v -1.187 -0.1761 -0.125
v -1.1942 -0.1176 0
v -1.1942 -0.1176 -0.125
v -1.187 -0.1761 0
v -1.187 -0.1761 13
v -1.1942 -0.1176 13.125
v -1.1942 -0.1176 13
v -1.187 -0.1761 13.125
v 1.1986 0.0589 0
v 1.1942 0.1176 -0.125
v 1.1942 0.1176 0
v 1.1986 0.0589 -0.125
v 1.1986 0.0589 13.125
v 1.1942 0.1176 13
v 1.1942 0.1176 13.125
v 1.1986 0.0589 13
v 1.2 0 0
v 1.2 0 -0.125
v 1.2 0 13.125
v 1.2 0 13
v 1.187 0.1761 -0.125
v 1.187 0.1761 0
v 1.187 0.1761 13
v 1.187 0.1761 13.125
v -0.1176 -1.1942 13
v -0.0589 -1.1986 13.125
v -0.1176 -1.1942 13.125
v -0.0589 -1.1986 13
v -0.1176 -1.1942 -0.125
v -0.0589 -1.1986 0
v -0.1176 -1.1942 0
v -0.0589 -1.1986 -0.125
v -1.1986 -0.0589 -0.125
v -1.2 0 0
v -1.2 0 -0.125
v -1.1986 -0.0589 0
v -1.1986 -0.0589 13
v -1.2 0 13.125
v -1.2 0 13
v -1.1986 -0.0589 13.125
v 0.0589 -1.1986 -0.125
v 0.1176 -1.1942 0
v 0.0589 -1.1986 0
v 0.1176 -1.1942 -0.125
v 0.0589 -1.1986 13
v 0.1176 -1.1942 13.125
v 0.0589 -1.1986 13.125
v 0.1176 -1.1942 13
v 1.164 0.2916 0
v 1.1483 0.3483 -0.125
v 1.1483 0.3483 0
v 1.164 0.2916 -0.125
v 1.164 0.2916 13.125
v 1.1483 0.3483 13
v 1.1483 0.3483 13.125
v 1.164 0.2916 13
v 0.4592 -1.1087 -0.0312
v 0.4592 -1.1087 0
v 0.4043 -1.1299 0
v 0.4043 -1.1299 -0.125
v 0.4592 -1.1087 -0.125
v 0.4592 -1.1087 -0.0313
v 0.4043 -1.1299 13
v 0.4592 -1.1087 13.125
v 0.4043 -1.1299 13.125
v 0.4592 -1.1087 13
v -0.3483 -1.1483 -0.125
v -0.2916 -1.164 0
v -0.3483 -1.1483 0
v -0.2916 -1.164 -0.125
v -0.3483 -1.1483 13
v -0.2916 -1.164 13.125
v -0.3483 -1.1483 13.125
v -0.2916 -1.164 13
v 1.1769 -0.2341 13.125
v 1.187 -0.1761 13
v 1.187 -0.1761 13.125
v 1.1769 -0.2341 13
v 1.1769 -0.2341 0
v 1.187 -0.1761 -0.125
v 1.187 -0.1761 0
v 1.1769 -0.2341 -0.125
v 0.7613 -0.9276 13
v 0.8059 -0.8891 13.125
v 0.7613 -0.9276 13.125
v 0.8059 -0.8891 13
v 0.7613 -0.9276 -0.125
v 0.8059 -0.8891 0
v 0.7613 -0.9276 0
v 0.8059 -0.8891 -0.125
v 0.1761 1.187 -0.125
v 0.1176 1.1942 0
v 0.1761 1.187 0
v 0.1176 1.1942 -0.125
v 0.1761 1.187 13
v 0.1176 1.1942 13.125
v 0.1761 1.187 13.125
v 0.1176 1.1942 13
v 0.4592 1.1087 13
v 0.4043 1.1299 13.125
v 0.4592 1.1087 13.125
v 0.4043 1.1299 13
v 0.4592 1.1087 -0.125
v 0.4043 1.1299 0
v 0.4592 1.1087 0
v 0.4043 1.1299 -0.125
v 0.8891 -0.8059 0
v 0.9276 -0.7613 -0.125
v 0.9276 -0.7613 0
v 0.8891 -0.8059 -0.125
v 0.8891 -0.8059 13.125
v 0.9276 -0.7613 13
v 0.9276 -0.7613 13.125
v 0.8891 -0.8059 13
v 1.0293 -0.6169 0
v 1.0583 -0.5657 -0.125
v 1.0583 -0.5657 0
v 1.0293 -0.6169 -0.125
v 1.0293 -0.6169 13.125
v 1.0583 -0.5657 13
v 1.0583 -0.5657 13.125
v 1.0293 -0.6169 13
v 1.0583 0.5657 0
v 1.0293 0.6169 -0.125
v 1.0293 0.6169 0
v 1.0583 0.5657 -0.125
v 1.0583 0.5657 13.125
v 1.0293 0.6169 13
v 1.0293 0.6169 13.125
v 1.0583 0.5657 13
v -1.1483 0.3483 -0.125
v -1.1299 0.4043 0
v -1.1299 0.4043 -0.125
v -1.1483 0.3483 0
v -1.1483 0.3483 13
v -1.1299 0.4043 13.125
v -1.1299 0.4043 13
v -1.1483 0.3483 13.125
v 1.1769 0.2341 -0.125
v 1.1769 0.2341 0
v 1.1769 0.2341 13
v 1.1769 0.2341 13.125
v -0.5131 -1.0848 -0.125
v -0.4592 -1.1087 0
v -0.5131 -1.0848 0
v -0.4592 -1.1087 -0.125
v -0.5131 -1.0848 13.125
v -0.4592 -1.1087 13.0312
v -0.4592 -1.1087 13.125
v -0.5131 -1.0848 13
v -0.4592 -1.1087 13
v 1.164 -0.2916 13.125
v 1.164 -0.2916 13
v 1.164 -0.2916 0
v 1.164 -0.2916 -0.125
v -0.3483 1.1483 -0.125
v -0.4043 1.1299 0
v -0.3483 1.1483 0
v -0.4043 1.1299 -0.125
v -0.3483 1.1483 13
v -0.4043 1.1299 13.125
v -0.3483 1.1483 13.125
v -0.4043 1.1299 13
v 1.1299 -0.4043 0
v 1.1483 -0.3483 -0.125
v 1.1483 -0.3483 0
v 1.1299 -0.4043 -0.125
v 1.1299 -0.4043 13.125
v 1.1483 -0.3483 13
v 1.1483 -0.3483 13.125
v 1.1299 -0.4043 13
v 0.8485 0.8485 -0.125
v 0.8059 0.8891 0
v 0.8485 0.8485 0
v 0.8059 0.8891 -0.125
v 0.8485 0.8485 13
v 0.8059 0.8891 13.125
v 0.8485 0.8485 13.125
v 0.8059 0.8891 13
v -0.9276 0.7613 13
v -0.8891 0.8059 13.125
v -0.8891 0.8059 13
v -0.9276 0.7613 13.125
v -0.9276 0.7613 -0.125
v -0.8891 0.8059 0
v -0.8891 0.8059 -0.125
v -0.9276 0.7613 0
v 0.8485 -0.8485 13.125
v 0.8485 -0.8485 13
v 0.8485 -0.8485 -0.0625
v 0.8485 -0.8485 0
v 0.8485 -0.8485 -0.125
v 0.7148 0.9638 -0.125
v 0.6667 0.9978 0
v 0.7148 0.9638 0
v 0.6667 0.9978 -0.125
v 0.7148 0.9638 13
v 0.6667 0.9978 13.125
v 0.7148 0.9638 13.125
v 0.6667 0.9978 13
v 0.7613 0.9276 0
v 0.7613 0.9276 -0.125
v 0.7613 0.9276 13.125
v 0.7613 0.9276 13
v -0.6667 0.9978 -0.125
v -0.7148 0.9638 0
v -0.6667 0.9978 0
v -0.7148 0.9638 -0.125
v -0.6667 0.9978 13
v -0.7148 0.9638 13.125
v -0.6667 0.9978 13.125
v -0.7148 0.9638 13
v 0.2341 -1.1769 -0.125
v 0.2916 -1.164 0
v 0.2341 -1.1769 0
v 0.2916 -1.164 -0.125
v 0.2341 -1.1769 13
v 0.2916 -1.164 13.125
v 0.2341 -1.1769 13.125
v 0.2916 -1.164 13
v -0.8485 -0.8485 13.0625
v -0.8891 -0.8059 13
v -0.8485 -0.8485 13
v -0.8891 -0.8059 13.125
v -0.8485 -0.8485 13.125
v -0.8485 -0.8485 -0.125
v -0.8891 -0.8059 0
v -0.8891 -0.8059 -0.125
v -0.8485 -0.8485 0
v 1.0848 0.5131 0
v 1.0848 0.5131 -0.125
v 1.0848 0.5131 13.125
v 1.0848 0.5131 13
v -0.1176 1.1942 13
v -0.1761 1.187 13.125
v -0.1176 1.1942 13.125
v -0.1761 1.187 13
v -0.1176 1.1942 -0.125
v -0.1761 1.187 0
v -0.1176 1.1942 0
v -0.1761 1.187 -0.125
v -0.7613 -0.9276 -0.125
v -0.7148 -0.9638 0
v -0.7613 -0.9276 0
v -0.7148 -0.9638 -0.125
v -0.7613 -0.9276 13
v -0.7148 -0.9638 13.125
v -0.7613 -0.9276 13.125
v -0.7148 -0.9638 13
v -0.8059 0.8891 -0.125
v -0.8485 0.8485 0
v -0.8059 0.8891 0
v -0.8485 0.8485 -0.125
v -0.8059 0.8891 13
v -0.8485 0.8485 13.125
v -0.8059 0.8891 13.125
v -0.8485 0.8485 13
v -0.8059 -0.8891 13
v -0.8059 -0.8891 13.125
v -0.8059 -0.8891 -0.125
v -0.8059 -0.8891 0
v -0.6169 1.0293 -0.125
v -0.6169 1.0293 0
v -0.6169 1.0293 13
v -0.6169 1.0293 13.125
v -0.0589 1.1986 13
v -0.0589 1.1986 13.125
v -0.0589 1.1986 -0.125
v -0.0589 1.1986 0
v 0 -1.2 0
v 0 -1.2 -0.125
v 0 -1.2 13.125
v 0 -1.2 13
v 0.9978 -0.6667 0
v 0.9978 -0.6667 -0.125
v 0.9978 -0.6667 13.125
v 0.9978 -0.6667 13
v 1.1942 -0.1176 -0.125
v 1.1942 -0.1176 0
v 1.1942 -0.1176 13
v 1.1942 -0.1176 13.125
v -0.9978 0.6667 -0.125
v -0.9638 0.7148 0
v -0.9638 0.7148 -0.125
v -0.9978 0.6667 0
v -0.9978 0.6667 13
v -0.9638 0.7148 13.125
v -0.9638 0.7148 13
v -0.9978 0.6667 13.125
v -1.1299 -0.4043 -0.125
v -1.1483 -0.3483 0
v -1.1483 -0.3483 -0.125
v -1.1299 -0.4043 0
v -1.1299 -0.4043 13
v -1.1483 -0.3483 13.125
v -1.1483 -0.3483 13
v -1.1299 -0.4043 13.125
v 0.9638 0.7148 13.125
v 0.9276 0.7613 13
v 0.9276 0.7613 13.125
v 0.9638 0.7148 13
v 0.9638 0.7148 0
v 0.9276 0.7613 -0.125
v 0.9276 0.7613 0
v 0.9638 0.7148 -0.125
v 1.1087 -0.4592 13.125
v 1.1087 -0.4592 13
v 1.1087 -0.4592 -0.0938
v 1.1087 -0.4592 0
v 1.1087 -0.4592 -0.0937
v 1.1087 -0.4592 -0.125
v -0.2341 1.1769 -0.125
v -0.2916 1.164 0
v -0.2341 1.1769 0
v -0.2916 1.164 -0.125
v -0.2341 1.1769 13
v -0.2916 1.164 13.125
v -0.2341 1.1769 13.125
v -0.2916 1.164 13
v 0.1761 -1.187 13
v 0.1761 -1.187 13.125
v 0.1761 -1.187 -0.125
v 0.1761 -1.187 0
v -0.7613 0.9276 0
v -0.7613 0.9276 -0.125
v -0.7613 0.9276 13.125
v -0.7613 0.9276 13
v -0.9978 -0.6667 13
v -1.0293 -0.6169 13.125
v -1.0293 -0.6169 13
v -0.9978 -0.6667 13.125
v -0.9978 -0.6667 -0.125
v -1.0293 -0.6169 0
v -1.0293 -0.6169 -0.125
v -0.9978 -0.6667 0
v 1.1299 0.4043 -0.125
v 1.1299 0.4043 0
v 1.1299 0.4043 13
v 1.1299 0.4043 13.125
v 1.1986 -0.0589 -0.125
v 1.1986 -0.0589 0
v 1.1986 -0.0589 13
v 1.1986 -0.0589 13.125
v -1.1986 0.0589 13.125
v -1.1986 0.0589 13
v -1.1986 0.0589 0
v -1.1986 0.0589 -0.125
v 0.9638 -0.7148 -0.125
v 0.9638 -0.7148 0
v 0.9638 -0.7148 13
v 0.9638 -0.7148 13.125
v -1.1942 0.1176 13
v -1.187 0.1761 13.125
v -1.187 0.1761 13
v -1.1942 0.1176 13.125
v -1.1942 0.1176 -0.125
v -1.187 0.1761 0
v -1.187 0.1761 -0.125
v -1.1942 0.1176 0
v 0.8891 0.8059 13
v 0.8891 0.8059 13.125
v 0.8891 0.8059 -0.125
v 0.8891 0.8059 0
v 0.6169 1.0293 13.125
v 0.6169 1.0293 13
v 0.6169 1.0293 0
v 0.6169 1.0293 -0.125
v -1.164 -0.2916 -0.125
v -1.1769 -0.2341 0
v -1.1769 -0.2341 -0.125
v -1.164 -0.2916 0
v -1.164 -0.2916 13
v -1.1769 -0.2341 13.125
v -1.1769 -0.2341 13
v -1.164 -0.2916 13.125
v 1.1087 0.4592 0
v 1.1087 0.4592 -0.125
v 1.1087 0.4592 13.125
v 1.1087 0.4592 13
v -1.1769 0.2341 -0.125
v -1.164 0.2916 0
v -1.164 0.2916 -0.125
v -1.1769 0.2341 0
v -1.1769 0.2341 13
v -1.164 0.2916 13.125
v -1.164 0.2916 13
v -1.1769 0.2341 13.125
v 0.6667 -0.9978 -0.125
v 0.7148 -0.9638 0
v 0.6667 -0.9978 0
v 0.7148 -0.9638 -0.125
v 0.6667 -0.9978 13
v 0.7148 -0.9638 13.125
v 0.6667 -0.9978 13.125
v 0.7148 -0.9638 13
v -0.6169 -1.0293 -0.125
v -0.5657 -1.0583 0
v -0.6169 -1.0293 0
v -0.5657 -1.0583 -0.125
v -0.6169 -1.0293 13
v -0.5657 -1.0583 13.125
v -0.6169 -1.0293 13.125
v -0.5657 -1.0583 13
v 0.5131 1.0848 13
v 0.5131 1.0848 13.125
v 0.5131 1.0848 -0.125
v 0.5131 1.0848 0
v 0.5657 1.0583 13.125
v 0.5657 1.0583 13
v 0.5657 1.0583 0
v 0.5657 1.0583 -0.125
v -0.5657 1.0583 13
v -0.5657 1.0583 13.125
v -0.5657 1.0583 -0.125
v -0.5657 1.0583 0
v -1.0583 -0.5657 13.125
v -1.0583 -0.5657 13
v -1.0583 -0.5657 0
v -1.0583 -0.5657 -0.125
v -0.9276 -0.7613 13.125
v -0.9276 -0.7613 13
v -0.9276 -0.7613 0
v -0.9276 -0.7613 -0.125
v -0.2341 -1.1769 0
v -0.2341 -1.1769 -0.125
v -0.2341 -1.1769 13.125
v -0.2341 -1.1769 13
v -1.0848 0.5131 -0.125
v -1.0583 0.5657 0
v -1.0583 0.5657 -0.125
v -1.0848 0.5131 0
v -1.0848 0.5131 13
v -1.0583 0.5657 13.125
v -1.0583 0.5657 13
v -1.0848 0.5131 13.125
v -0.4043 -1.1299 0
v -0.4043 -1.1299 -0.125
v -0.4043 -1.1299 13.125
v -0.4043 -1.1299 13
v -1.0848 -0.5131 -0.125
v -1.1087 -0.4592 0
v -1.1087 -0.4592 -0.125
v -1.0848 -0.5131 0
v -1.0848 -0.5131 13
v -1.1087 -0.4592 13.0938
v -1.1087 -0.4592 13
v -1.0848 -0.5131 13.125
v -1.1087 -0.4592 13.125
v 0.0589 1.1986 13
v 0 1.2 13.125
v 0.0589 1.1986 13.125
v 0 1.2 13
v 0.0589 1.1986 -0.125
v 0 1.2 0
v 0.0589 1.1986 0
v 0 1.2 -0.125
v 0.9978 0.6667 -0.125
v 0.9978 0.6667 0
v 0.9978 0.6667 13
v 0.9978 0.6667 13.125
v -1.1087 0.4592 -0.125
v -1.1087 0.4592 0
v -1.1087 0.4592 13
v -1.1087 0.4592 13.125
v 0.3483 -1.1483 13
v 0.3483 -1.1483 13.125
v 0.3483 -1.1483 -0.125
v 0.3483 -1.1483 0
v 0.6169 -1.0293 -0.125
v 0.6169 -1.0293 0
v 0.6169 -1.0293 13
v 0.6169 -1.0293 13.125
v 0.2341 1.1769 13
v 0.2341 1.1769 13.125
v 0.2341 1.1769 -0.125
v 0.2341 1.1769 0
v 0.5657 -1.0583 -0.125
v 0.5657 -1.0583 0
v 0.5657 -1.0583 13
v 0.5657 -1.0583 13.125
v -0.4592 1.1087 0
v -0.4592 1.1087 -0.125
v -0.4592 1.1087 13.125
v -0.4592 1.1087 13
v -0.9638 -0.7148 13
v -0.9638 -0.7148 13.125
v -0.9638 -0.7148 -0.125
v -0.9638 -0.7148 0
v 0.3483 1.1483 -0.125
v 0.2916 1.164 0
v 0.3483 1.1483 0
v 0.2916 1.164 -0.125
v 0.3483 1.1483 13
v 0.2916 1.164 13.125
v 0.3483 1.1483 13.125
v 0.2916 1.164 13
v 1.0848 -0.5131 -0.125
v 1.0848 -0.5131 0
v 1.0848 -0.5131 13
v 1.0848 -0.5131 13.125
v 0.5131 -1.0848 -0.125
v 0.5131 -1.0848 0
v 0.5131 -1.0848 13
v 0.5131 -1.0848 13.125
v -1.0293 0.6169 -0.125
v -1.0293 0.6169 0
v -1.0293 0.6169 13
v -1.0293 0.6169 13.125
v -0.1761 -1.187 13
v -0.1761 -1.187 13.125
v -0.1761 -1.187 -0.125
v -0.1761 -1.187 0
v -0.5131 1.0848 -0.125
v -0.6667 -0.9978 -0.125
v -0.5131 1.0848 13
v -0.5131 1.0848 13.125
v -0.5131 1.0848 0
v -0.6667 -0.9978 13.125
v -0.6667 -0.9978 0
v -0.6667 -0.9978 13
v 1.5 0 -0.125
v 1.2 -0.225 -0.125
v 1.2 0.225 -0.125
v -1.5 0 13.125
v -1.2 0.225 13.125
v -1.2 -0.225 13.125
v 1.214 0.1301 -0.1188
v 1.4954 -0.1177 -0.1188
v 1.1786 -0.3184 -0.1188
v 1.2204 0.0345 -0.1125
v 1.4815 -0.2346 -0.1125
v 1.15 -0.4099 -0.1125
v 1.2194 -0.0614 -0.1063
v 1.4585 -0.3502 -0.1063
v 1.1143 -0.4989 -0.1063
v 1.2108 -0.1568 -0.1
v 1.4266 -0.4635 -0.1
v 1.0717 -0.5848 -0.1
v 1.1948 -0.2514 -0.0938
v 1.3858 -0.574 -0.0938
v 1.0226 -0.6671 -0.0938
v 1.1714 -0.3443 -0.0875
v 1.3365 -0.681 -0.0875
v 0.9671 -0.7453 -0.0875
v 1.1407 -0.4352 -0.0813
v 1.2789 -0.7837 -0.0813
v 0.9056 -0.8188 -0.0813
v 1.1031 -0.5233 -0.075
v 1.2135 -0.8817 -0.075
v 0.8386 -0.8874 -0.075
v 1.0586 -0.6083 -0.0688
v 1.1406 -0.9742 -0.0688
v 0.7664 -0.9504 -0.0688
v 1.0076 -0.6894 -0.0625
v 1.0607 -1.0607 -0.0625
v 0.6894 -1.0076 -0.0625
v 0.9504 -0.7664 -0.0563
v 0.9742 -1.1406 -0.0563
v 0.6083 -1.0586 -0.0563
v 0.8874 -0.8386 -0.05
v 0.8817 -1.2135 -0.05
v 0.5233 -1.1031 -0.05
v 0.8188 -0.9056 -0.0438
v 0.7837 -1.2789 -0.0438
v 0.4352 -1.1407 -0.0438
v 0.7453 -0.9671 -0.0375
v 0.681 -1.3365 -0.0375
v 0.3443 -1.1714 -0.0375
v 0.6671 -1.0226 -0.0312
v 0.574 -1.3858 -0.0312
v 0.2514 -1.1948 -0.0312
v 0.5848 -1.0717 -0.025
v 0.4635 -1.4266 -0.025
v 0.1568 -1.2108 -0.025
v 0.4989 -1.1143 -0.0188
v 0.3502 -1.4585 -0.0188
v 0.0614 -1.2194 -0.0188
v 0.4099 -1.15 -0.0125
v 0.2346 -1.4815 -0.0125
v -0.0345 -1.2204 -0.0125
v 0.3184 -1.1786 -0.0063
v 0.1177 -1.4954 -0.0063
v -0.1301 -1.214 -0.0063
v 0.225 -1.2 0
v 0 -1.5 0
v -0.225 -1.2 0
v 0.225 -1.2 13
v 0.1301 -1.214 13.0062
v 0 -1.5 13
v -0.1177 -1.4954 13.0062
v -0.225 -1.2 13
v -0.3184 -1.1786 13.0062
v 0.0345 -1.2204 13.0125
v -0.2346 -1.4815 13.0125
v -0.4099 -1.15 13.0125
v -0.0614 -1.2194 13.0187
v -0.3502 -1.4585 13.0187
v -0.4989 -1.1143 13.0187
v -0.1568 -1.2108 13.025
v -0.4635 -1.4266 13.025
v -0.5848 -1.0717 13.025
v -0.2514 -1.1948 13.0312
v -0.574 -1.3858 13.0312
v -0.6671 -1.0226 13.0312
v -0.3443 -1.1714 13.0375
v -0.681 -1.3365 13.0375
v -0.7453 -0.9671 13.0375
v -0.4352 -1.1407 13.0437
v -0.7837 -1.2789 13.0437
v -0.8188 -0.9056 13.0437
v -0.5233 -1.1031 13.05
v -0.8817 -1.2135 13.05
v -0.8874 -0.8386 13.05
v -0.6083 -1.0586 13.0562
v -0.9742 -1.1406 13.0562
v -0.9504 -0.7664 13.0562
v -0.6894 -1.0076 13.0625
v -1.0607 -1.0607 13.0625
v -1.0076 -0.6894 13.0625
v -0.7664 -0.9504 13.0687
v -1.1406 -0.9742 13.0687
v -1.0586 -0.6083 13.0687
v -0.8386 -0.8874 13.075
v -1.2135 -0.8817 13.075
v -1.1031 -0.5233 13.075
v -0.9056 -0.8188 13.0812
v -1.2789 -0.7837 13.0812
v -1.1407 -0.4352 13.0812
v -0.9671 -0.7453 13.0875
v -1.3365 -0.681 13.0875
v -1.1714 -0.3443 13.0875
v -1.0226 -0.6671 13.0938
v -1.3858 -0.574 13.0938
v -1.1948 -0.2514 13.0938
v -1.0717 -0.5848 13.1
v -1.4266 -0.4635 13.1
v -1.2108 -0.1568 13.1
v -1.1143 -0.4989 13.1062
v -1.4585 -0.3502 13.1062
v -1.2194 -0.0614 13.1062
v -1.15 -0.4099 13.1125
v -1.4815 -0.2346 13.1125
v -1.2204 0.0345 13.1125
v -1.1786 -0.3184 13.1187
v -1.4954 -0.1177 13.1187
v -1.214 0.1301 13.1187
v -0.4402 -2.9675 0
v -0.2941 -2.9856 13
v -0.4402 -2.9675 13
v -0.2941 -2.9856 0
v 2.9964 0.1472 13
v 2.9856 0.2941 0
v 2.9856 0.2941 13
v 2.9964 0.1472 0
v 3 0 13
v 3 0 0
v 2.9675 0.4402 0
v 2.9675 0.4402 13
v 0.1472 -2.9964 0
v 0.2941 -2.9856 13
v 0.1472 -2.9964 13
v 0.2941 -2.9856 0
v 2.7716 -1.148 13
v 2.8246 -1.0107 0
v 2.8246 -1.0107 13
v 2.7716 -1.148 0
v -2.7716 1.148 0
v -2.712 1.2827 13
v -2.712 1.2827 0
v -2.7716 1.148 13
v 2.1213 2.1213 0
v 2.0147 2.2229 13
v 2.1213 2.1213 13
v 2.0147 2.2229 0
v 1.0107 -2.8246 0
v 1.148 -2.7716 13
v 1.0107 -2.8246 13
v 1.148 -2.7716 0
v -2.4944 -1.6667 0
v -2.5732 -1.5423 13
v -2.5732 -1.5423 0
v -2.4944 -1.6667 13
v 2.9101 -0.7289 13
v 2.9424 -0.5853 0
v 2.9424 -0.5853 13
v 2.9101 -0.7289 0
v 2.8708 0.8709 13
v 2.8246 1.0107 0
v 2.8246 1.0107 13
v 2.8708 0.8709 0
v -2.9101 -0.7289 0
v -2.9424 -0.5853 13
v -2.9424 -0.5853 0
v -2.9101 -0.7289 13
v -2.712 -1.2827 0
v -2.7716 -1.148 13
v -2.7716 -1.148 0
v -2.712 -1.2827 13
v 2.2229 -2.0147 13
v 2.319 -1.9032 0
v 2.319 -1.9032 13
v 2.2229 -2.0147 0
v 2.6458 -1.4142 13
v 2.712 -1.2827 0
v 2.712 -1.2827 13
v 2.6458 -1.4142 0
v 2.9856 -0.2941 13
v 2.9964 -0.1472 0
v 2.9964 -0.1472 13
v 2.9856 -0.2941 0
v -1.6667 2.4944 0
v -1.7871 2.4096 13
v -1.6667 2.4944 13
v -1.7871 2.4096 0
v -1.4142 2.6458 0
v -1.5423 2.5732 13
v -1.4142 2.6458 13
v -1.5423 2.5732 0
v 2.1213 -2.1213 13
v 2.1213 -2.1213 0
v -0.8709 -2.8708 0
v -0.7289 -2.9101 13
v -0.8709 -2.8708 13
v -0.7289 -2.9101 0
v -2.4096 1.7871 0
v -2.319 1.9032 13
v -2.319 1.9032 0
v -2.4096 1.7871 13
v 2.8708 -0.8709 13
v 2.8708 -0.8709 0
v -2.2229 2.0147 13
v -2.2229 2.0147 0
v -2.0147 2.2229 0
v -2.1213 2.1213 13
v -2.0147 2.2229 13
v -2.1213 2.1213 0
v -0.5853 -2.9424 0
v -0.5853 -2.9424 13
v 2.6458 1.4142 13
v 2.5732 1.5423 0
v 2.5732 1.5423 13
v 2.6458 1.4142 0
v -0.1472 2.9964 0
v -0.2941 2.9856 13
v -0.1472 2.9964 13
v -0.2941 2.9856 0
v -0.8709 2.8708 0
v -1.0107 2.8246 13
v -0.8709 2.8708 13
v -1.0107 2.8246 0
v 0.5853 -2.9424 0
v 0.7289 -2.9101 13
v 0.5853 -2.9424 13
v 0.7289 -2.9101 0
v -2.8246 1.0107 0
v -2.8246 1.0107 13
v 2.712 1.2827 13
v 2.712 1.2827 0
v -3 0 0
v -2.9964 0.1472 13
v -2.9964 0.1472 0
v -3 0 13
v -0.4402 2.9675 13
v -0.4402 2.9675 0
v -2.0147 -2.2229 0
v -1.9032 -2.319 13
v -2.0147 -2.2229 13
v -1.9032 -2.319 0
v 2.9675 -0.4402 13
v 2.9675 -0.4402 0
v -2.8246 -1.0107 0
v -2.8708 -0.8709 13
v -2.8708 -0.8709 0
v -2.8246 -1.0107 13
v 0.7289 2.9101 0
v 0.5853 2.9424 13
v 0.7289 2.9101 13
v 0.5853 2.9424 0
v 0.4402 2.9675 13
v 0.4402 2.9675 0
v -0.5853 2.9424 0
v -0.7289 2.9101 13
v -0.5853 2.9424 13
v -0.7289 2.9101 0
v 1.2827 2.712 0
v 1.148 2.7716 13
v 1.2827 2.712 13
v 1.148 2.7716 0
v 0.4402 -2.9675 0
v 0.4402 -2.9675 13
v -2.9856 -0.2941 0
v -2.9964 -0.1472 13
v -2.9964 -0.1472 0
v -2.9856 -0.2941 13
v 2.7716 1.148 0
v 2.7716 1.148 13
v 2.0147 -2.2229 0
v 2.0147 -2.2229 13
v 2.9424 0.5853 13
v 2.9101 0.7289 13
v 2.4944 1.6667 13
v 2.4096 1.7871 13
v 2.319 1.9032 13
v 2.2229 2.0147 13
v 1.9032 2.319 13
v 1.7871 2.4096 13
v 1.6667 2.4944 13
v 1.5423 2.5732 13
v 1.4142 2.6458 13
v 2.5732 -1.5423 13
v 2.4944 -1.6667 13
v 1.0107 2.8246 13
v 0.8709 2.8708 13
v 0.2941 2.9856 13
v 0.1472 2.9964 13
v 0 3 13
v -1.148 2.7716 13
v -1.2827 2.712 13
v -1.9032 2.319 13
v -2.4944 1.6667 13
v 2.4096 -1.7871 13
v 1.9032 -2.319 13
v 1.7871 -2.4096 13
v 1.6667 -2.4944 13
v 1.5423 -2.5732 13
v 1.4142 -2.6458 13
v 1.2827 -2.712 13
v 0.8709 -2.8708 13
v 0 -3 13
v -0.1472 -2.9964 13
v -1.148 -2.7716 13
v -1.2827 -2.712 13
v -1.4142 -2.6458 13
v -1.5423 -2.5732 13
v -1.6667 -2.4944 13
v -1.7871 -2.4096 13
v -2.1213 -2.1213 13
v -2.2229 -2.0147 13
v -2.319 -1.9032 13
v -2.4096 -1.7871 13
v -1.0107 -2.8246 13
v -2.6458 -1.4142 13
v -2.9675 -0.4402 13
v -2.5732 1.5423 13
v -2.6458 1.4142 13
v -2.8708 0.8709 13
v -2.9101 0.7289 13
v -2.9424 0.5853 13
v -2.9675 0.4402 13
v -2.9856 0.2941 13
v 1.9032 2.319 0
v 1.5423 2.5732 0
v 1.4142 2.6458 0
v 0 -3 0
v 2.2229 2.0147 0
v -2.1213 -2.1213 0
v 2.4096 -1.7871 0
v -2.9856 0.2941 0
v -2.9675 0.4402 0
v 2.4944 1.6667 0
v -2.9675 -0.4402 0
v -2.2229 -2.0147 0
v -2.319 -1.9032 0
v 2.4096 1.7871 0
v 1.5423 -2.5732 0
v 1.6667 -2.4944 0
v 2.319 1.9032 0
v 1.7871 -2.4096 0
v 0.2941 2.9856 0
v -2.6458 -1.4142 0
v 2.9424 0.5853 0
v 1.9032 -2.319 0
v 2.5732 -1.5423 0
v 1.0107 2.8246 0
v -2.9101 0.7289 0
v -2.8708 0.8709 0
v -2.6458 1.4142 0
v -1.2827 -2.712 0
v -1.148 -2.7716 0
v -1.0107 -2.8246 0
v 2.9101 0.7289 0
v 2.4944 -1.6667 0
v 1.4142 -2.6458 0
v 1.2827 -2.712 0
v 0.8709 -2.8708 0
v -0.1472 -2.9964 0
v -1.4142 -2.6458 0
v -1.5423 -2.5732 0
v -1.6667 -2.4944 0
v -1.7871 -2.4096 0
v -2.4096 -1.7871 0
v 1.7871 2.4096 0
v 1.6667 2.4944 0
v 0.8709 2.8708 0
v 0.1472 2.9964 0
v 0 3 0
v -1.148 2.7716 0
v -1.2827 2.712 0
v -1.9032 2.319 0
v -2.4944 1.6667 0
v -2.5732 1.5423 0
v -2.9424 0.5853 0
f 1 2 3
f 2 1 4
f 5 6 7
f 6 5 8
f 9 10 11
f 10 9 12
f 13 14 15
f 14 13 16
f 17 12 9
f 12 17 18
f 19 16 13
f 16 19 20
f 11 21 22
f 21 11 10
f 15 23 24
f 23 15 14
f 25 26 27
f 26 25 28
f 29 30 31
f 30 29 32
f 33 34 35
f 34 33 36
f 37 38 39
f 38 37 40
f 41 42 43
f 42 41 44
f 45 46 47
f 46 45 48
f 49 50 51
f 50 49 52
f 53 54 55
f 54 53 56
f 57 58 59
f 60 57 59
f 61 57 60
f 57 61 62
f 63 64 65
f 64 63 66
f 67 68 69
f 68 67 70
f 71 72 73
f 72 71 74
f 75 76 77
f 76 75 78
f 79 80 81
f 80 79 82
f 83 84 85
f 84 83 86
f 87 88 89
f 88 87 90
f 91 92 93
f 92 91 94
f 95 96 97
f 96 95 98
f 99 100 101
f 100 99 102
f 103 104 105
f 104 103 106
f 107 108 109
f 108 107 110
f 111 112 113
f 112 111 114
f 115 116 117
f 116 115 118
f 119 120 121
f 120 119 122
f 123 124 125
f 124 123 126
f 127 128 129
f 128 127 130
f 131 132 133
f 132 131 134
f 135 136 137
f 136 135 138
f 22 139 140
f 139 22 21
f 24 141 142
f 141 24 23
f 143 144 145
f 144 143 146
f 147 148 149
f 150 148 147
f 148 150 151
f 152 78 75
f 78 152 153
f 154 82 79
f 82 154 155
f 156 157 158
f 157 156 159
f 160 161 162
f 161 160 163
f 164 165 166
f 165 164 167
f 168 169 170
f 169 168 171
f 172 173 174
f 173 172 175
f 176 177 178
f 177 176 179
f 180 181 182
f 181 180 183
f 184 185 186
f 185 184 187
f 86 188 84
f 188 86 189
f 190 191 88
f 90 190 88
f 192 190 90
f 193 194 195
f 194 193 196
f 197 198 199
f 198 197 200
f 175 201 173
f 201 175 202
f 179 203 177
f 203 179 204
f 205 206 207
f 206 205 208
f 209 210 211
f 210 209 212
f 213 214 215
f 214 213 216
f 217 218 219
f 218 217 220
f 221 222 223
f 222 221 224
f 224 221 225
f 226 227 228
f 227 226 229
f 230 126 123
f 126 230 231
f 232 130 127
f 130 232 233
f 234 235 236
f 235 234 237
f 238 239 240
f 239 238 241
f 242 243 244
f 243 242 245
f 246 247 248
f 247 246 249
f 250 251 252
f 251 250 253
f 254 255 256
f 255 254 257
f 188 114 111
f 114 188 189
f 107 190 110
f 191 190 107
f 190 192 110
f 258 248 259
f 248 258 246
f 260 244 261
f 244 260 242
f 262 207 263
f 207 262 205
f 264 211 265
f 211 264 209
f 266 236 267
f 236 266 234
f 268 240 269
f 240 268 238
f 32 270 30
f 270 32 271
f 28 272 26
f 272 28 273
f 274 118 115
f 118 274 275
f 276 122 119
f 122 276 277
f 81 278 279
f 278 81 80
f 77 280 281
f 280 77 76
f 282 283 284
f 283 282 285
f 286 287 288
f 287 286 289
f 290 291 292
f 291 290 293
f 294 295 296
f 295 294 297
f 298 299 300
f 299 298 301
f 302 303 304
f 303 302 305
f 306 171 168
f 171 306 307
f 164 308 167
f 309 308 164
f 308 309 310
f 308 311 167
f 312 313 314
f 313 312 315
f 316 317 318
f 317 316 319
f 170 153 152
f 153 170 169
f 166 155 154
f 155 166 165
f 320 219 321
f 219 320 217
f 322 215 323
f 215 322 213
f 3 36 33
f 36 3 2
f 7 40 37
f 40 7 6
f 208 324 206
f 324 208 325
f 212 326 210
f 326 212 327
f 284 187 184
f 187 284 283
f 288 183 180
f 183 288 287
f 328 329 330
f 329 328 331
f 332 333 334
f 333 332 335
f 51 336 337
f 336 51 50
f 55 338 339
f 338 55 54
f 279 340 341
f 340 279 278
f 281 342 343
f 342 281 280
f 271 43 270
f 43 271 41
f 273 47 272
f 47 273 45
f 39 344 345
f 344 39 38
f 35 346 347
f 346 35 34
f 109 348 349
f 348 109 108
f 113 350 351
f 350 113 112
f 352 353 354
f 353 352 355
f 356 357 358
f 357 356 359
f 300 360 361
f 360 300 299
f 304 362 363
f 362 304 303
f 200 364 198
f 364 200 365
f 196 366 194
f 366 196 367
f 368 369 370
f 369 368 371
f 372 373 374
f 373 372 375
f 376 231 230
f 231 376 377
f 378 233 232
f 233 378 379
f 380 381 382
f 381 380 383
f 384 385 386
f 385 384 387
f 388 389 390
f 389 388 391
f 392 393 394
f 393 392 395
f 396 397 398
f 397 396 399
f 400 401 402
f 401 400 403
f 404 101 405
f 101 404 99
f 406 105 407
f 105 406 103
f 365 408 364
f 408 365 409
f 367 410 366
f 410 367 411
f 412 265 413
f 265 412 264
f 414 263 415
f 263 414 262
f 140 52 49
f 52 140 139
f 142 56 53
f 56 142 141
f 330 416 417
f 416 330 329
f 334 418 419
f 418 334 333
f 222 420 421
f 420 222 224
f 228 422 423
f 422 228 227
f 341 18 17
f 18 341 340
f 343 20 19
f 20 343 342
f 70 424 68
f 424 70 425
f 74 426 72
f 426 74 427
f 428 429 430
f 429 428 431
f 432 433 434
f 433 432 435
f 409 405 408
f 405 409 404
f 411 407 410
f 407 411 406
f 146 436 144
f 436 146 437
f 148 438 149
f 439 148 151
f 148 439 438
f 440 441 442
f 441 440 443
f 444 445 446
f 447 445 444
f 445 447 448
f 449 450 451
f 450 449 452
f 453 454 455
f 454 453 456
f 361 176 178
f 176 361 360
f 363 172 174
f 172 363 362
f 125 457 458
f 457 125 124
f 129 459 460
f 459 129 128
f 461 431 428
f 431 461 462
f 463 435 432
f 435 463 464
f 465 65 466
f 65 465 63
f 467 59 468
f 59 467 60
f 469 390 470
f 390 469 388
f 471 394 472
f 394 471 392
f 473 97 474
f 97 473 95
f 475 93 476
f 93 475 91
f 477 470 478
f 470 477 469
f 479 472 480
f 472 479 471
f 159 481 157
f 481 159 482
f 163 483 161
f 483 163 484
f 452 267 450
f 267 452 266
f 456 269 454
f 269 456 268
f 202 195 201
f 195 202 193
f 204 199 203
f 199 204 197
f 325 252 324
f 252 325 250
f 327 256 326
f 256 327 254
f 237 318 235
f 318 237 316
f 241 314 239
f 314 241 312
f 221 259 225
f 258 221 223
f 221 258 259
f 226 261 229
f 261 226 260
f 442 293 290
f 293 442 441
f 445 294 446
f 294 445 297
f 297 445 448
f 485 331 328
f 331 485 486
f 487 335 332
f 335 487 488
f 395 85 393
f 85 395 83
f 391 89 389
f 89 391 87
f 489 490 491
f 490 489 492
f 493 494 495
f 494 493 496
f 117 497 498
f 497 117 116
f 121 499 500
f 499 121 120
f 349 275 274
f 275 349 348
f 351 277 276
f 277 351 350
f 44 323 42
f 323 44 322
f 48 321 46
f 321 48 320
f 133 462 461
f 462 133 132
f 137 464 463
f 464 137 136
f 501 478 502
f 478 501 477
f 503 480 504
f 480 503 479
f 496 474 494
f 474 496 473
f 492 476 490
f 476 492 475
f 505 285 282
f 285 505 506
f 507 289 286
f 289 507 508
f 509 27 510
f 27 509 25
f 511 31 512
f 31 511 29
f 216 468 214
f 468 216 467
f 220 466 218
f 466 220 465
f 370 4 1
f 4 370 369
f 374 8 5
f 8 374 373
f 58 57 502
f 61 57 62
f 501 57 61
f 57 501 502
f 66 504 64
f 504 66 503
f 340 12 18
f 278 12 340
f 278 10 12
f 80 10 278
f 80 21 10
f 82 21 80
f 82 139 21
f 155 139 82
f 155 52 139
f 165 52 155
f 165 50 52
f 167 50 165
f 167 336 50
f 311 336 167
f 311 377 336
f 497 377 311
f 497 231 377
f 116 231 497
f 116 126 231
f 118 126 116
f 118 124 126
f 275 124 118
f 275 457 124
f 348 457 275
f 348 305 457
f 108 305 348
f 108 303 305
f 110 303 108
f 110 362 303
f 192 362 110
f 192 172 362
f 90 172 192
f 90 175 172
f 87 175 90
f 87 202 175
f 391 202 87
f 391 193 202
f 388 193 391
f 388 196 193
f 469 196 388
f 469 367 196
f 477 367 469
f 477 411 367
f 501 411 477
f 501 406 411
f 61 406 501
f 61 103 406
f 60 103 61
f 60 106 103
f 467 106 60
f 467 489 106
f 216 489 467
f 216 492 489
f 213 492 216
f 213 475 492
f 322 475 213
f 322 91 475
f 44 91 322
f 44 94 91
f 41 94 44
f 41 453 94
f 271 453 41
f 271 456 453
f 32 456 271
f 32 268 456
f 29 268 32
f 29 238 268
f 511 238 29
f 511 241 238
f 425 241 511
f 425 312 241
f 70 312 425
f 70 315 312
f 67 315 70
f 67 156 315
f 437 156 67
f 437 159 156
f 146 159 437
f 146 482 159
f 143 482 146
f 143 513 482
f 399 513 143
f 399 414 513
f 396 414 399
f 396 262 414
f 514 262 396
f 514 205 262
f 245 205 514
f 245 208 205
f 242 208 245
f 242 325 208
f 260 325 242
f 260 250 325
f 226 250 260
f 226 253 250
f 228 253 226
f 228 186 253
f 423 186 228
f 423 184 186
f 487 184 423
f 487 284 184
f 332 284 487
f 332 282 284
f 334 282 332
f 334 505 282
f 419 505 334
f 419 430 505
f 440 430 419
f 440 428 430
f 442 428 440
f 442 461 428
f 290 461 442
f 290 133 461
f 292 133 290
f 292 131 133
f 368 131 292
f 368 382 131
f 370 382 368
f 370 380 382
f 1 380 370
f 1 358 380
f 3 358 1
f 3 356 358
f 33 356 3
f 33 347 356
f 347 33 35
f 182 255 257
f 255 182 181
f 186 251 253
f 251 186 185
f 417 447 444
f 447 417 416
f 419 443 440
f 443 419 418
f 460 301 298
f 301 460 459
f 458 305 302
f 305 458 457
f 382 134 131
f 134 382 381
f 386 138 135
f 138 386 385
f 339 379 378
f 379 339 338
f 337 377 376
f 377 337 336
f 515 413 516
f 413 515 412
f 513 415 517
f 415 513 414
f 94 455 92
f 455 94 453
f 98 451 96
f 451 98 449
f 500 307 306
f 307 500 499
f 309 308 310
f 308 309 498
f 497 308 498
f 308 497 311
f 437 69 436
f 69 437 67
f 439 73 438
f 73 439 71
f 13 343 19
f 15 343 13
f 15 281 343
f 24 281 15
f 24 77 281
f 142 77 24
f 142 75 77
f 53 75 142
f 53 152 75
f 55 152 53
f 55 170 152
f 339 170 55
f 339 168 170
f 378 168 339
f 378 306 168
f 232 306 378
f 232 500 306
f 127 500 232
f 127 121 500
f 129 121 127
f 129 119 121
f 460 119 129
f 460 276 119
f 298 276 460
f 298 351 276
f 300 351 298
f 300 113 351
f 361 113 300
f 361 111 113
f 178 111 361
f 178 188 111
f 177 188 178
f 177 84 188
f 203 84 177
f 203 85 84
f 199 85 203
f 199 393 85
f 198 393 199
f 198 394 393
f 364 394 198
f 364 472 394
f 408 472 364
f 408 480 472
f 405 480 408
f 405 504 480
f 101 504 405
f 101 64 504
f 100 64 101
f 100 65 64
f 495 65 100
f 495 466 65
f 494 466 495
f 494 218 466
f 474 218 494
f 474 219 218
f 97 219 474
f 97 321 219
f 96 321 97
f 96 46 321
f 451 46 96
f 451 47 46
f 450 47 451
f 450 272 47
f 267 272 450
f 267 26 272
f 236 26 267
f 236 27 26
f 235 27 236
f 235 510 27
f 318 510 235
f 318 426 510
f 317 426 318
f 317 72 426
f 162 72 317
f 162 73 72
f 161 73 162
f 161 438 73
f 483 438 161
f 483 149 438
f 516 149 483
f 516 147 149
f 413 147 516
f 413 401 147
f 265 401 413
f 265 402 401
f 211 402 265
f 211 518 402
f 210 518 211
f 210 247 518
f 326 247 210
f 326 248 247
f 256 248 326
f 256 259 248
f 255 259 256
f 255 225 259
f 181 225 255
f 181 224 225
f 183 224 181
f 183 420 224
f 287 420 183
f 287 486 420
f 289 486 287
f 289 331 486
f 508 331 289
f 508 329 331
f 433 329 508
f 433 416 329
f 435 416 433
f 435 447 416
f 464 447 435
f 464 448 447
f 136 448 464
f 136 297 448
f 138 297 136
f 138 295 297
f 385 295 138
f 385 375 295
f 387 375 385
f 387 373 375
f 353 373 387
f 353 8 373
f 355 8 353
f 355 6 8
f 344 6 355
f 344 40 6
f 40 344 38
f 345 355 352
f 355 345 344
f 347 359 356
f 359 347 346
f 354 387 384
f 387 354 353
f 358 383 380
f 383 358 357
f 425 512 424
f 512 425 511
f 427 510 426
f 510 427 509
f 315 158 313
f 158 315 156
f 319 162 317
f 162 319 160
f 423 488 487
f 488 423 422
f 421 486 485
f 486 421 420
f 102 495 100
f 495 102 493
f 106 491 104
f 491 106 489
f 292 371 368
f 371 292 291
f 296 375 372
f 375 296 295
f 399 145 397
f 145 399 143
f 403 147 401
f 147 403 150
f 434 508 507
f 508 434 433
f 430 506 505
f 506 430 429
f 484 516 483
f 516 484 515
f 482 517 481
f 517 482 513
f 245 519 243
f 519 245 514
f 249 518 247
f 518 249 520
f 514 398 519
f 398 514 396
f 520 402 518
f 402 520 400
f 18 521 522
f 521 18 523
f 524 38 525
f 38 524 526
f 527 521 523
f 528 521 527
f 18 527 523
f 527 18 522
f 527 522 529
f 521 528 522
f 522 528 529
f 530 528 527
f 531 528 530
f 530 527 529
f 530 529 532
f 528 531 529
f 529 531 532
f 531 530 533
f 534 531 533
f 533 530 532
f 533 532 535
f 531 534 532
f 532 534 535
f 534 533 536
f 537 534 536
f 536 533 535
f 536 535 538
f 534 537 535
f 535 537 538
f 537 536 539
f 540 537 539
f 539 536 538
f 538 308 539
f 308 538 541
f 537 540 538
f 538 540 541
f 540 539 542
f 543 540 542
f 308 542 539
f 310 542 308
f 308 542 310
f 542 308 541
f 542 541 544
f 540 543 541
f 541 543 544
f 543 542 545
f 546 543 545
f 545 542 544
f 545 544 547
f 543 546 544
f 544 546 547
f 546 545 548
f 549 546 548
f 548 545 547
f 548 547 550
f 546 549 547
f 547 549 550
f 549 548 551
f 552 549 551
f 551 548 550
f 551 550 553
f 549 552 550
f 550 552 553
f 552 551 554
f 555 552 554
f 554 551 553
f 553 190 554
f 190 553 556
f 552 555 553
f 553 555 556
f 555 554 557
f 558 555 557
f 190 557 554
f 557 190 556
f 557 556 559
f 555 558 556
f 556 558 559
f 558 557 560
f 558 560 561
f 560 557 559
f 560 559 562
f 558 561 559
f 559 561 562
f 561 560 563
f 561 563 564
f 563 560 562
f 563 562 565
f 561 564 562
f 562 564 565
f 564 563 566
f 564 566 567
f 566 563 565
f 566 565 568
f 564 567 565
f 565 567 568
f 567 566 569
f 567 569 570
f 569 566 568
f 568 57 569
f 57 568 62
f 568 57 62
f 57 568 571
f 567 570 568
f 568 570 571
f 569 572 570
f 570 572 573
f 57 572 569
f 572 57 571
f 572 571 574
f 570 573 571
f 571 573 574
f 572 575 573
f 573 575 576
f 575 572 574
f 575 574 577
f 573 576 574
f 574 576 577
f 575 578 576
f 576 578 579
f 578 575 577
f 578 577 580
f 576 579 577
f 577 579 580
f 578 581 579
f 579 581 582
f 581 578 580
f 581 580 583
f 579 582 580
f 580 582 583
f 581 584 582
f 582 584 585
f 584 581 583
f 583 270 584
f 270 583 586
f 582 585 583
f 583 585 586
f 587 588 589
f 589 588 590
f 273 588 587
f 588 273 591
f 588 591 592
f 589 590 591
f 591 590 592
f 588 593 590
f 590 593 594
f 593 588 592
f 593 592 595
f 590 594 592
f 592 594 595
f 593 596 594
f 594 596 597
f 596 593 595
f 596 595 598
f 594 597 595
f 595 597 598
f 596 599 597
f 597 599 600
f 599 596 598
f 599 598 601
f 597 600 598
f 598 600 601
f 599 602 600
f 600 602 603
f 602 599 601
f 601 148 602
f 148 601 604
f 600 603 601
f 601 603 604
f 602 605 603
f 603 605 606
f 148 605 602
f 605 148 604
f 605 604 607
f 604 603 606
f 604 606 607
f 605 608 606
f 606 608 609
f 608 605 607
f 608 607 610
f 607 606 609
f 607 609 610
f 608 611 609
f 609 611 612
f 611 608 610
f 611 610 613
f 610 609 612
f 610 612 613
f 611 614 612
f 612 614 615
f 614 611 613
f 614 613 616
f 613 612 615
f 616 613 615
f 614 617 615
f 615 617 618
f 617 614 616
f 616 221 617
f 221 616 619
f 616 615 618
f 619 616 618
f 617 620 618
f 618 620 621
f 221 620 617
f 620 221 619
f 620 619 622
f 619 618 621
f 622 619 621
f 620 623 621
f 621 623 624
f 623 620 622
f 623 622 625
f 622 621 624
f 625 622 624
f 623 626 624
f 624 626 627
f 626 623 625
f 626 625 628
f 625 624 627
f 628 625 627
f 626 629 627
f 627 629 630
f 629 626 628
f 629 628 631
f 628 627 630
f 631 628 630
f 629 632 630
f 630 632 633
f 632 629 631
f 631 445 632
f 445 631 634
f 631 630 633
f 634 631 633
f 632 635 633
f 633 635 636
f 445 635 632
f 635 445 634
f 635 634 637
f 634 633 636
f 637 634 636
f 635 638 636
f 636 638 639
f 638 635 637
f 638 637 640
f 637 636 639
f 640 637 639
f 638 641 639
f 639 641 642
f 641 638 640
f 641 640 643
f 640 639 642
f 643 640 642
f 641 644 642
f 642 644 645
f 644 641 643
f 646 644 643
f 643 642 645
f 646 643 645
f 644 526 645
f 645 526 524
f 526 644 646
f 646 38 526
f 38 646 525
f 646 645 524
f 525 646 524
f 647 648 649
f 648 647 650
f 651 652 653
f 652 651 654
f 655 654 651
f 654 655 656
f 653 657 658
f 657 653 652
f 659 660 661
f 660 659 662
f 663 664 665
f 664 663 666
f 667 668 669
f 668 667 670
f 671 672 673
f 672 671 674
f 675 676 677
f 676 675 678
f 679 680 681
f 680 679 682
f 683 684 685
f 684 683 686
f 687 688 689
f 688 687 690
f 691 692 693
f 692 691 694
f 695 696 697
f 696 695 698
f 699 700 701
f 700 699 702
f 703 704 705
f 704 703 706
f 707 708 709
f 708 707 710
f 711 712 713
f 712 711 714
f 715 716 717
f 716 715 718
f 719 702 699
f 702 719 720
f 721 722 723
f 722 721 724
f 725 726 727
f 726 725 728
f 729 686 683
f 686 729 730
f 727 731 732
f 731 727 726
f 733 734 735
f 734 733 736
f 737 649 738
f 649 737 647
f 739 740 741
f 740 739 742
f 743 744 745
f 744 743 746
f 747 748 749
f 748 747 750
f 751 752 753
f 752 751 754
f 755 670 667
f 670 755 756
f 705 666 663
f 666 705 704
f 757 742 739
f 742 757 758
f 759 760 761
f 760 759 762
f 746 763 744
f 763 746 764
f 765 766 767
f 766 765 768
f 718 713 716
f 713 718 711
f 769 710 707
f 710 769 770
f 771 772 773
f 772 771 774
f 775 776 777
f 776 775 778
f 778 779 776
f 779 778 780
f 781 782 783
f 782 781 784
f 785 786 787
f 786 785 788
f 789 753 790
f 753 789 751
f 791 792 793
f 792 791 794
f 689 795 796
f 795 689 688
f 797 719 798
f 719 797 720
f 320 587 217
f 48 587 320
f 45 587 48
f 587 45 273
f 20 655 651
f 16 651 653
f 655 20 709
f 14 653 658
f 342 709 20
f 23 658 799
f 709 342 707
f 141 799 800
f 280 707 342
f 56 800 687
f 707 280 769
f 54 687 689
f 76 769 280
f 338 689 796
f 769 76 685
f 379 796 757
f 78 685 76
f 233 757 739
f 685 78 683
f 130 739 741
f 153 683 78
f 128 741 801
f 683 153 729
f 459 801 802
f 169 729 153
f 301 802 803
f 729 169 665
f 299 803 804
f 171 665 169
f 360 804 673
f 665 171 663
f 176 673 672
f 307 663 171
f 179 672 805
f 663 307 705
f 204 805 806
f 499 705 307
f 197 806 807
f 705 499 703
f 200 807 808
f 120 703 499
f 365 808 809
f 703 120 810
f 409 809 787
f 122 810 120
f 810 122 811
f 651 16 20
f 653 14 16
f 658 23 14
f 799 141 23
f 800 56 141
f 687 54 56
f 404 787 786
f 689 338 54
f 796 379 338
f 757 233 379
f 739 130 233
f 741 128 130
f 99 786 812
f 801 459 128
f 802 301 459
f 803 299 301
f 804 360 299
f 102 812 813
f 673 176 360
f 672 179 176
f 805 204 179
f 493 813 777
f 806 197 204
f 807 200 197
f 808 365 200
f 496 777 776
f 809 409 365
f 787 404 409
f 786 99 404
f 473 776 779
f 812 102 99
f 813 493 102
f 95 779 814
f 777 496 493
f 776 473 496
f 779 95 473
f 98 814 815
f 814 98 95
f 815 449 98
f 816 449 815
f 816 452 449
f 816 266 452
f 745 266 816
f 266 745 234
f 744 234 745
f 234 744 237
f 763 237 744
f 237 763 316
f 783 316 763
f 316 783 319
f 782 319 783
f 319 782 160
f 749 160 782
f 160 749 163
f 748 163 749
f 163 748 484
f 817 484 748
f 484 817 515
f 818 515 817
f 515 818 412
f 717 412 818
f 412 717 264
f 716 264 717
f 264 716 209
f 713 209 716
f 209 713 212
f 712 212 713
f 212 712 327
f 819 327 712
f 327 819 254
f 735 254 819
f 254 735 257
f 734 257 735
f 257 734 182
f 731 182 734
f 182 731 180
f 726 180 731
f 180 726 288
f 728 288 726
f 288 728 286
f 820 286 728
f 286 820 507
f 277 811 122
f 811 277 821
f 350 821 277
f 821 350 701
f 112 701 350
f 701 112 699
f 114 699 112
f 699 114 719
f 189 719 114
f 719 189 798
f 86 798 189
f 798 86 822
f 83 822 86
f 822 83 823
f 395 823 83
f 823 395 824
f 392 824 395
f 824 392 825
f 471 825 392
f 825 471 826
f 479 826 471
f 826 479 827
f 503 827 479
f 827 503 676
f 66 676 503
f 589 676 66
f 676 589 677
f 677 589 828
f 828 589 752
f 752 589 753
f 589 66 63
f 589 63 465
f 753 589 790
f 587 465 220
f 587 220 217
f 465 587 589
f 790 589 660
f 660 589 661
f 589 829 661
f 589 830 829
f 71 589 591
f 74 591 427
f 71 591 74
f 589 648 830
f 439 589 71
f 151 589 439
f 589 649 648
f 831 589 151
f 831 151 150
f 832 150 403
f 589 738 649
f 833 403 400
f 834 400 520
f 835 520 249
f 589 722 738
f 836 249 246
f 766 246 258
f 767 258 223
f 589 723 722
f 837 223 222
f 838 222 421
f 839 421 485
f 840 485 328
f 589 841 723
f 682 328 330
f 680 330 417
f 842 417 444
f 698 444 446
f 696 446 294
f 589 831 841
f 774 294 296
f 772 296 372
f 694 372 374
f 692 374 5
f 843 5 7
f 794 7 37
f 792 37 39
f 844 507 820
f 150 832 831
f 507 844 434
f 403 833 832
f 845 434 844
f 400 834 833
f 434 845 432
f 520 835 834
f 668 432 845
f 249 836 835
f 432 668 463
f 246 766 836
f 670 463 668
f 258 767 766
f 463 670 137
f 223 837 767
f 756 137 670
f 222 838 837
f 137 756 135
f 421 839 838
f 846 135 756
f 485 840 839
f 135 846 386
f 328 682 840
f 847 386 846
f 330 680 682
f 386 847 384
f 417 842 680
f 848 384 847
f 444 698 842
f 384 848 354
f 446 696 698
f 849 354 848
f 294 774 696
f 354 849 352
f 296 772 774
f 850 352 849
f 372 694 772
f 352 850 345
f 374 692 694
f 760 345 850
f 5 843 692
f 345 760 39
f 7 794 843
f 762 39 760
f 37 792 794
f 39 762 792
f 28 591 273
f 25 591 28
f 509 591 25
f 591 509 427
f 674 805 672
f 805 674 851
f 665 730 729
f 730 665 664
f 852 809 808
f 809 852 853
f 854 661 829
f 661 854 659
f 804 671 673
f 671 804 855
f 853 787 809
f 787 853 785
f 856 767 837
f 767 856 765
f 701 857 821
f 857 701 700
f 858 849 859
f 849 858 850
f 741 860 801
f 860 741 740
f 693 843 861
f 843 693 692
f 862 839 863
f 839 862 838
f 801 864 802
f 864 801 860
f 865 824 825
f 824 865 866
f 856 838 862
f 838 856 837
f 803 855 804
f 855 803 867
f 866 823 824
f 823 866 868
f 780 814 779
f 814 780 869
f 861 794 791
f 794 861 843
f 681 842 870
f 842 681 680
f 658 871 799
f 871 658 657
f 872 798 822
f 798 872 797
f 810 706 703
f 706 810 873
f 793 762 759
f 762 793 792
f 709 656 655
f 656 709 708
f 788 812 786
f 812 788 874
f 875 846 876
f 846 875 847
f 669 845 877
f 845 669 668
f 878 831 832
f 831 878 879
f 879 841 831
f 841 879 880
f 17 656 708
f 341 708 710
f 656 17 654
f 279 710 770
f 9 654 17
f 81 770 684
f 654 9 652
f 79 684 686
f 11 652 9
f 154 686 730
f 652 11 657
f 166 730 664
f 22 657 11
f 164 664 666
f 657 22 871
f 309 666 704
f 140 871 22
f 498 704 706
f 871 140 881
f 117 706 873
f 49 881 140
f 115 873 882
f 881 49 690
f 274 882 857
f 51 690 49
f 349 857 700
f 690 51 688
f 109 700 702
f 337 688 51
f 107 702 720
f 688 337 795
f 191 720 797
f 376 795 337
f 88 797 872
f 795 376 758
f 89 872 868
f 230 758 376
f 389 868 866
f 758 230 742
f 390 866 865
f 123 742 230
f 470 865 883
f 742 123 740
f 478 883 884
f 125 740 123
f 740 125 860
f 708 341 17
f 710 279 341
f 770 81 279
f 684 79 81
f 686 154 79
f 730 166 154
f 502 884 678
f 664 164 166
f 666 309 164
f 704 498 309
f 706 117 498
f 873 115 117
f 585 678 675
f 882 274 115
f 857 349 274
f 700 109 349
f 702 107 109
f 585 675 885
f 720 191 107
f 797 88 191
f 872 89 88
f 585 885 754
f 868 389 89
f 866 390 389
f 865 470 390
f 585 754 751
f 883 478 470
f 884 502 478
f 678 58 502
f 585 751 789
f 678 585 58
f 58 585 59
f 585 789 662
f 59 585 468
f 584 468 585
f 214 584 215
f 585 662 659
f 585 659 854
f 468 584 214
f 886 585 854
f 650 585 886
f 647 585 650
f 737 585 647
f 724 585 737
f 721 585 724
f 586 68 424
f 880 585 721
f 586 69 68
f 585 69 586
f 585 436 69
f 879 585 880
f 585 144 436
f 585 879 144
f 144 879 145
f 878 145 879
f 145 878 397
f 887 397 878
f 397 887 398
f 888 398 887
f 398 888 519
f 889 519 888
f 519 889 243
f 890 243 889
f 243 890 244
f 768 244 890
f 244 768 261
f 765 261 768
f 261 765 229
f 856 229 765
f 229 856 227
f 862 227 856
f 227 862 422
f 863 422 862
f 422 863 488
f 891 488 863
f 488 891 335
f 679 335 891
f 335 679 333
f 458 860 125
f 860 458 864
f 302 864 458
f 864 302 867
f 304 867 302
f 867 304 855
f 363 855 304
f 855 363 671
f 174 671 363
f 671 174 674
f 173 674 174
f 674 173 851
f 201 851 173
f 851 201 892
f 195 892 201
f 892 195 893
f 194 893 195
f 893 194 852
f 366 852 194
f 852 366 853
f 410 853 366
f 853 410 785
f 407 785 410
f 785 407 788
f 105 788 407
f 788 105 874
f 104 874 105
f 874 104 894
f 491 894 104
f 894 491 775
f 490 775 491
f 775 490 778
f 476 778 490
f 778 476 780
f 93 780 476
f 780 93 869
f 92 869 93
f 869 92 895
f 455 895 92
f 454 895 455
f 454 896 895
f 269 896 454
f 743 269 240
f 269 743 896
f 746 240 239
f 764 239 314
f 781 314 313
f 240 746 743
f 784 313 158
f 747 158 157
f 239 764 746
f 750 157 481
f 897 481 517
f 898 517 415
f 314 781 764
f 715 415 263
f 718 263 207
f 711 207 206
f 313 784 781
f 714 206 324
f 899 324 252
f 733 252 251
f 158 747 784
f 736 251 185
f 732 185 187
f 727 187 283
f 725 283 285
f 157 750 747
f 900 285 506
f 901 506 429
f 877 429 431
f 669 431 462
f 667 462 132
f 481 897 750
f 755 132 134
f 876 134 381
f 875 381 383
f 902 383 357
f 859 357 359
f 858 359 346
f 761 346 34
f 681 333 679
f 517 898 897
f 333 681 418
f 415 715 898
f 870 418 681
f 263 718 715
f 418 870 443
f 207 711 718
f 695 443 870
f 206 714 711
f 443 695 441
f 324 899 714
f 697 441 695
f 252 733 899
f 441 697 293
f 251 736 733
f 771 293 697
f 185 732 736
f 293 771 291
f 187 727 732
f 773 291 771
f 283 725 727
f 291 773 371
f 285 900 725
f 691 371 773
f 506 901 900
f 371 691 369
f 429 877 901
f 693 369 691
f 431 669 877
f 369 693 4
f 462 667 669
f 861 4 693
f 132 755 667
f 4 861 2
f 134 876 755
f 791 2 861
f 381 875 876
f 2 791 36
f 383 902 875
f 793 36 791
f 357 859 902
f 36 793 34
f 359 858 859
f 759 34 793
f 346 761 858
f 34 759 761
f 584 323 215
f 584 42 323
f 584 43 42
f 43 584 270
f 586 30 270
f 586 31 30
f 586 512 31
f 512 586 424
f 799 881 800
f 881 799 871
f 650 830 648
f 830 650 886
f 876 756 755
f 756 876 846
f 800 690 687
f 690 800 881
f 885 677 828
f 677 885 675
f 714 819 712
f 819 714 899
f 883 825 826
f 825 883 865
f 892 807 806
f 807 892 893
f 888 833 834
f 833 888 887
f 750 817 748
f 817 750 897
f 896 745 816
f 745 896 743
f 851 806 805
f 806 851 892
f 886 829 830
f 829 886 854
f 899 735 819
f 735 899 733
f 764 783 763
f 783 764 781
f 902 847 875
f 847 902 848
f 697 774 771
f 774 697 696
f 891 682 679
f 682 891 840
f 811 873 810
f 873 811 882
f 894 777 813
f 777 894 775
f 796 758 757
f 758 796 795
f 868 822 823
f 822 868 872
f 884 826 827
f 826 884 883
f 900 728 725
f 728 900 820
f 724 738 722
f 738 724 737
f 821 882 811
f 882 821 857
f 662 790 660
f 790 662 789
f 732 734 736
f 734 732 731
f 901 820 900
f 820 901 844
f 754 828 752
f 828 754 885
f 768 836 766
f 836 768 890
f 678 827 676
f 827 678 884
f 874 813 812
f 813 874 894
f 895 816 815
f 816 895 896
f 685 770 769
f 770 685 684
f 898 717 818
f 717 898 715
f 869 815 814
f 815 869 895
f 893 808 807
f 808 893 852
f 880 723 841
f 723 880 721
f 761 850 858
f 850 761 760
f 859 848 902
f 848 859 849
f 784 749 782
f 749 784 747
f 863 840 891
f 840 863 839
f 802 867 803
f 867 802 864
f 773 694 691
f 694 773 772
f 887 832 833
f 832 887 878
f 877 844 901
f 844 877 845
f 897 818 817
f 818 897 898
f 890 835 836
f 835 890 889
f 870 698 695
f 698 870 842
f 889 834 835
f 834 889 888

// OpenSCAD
// Standoff pillar: M3 external thread, 13mm long, diameter unspecified -> default body diameter
$fn = 128;

// Parameters
thread_diameter_mm = 3.0;          // M3 major diameter
length_mm = 13.0;                  // overall length
outer_diameter_mm = 6.0;           // default pillar OD (set as needed)

// Thread parameters (visible helical external thread approximation)
thread_pitch_mm = 0.5;             // M3 coarse pitch
thread_depth_mm = 0.30;            // radial depth (slightly exaggerated for visibility)
thread_length_mm = length_mm;      // fully threaded
thread_starts = 1;

// Small overlaps to ensure watertight union
overlap_mm = 0.25;

// Helical external thread using linear_extrude(twist) of a triangular profile
module external_thread(d_major, pitch, length, depth, starts=1) {
    turns = length / pitch;
    d_minor = d_major - 2*depth;

    // Triangular ridge profile (approx 60° thread form), swept helically
    // Built around the minor cylinder so the ridge reaches the major diameter.
    union() {
        // Minor diameter core
        cylinder(h=length, r=d_minor/2, center=false);

        // Helical ridge
        for (s = [0:starts-1]) {
            rotate([0, 0, s*360/starts])
                linear_extrude(
                    height=length,
                    twist=turns*360,
                    slices=max(ceil(turns*80), 120),
                    center=false,
                    convexity=10
                )
                translate([d_minor/2, 0, 0])
                    polygon(points=[
                        [0, -pitch*0.45],
                        [depth, 0],
                        [0,  pitch*0.45]
                    ]);
        }
    }
}

// Main standoff pillar (one connected solid)
module standoff_pillar() {
    // Ensure body is at least as large as the thread major diameter
    body_d = max(outer_diameter_mm, thread_diameter_mm);

    union() {
        // Body cylinder (full length)
        cylinder(h=length_mm, r=body_d/2, center=false);

        // External thread (full length), aligned to body with slight overlap
        translate([0, 0, -overlap_mm/2])
            external_thread(
                thread_diameter_mm,
                thread_pitch_mm,
                length_mm + overlap_mm,
                thread_depth_mm,
                thread_starts
            );
    }
}

standoff_pillar();
